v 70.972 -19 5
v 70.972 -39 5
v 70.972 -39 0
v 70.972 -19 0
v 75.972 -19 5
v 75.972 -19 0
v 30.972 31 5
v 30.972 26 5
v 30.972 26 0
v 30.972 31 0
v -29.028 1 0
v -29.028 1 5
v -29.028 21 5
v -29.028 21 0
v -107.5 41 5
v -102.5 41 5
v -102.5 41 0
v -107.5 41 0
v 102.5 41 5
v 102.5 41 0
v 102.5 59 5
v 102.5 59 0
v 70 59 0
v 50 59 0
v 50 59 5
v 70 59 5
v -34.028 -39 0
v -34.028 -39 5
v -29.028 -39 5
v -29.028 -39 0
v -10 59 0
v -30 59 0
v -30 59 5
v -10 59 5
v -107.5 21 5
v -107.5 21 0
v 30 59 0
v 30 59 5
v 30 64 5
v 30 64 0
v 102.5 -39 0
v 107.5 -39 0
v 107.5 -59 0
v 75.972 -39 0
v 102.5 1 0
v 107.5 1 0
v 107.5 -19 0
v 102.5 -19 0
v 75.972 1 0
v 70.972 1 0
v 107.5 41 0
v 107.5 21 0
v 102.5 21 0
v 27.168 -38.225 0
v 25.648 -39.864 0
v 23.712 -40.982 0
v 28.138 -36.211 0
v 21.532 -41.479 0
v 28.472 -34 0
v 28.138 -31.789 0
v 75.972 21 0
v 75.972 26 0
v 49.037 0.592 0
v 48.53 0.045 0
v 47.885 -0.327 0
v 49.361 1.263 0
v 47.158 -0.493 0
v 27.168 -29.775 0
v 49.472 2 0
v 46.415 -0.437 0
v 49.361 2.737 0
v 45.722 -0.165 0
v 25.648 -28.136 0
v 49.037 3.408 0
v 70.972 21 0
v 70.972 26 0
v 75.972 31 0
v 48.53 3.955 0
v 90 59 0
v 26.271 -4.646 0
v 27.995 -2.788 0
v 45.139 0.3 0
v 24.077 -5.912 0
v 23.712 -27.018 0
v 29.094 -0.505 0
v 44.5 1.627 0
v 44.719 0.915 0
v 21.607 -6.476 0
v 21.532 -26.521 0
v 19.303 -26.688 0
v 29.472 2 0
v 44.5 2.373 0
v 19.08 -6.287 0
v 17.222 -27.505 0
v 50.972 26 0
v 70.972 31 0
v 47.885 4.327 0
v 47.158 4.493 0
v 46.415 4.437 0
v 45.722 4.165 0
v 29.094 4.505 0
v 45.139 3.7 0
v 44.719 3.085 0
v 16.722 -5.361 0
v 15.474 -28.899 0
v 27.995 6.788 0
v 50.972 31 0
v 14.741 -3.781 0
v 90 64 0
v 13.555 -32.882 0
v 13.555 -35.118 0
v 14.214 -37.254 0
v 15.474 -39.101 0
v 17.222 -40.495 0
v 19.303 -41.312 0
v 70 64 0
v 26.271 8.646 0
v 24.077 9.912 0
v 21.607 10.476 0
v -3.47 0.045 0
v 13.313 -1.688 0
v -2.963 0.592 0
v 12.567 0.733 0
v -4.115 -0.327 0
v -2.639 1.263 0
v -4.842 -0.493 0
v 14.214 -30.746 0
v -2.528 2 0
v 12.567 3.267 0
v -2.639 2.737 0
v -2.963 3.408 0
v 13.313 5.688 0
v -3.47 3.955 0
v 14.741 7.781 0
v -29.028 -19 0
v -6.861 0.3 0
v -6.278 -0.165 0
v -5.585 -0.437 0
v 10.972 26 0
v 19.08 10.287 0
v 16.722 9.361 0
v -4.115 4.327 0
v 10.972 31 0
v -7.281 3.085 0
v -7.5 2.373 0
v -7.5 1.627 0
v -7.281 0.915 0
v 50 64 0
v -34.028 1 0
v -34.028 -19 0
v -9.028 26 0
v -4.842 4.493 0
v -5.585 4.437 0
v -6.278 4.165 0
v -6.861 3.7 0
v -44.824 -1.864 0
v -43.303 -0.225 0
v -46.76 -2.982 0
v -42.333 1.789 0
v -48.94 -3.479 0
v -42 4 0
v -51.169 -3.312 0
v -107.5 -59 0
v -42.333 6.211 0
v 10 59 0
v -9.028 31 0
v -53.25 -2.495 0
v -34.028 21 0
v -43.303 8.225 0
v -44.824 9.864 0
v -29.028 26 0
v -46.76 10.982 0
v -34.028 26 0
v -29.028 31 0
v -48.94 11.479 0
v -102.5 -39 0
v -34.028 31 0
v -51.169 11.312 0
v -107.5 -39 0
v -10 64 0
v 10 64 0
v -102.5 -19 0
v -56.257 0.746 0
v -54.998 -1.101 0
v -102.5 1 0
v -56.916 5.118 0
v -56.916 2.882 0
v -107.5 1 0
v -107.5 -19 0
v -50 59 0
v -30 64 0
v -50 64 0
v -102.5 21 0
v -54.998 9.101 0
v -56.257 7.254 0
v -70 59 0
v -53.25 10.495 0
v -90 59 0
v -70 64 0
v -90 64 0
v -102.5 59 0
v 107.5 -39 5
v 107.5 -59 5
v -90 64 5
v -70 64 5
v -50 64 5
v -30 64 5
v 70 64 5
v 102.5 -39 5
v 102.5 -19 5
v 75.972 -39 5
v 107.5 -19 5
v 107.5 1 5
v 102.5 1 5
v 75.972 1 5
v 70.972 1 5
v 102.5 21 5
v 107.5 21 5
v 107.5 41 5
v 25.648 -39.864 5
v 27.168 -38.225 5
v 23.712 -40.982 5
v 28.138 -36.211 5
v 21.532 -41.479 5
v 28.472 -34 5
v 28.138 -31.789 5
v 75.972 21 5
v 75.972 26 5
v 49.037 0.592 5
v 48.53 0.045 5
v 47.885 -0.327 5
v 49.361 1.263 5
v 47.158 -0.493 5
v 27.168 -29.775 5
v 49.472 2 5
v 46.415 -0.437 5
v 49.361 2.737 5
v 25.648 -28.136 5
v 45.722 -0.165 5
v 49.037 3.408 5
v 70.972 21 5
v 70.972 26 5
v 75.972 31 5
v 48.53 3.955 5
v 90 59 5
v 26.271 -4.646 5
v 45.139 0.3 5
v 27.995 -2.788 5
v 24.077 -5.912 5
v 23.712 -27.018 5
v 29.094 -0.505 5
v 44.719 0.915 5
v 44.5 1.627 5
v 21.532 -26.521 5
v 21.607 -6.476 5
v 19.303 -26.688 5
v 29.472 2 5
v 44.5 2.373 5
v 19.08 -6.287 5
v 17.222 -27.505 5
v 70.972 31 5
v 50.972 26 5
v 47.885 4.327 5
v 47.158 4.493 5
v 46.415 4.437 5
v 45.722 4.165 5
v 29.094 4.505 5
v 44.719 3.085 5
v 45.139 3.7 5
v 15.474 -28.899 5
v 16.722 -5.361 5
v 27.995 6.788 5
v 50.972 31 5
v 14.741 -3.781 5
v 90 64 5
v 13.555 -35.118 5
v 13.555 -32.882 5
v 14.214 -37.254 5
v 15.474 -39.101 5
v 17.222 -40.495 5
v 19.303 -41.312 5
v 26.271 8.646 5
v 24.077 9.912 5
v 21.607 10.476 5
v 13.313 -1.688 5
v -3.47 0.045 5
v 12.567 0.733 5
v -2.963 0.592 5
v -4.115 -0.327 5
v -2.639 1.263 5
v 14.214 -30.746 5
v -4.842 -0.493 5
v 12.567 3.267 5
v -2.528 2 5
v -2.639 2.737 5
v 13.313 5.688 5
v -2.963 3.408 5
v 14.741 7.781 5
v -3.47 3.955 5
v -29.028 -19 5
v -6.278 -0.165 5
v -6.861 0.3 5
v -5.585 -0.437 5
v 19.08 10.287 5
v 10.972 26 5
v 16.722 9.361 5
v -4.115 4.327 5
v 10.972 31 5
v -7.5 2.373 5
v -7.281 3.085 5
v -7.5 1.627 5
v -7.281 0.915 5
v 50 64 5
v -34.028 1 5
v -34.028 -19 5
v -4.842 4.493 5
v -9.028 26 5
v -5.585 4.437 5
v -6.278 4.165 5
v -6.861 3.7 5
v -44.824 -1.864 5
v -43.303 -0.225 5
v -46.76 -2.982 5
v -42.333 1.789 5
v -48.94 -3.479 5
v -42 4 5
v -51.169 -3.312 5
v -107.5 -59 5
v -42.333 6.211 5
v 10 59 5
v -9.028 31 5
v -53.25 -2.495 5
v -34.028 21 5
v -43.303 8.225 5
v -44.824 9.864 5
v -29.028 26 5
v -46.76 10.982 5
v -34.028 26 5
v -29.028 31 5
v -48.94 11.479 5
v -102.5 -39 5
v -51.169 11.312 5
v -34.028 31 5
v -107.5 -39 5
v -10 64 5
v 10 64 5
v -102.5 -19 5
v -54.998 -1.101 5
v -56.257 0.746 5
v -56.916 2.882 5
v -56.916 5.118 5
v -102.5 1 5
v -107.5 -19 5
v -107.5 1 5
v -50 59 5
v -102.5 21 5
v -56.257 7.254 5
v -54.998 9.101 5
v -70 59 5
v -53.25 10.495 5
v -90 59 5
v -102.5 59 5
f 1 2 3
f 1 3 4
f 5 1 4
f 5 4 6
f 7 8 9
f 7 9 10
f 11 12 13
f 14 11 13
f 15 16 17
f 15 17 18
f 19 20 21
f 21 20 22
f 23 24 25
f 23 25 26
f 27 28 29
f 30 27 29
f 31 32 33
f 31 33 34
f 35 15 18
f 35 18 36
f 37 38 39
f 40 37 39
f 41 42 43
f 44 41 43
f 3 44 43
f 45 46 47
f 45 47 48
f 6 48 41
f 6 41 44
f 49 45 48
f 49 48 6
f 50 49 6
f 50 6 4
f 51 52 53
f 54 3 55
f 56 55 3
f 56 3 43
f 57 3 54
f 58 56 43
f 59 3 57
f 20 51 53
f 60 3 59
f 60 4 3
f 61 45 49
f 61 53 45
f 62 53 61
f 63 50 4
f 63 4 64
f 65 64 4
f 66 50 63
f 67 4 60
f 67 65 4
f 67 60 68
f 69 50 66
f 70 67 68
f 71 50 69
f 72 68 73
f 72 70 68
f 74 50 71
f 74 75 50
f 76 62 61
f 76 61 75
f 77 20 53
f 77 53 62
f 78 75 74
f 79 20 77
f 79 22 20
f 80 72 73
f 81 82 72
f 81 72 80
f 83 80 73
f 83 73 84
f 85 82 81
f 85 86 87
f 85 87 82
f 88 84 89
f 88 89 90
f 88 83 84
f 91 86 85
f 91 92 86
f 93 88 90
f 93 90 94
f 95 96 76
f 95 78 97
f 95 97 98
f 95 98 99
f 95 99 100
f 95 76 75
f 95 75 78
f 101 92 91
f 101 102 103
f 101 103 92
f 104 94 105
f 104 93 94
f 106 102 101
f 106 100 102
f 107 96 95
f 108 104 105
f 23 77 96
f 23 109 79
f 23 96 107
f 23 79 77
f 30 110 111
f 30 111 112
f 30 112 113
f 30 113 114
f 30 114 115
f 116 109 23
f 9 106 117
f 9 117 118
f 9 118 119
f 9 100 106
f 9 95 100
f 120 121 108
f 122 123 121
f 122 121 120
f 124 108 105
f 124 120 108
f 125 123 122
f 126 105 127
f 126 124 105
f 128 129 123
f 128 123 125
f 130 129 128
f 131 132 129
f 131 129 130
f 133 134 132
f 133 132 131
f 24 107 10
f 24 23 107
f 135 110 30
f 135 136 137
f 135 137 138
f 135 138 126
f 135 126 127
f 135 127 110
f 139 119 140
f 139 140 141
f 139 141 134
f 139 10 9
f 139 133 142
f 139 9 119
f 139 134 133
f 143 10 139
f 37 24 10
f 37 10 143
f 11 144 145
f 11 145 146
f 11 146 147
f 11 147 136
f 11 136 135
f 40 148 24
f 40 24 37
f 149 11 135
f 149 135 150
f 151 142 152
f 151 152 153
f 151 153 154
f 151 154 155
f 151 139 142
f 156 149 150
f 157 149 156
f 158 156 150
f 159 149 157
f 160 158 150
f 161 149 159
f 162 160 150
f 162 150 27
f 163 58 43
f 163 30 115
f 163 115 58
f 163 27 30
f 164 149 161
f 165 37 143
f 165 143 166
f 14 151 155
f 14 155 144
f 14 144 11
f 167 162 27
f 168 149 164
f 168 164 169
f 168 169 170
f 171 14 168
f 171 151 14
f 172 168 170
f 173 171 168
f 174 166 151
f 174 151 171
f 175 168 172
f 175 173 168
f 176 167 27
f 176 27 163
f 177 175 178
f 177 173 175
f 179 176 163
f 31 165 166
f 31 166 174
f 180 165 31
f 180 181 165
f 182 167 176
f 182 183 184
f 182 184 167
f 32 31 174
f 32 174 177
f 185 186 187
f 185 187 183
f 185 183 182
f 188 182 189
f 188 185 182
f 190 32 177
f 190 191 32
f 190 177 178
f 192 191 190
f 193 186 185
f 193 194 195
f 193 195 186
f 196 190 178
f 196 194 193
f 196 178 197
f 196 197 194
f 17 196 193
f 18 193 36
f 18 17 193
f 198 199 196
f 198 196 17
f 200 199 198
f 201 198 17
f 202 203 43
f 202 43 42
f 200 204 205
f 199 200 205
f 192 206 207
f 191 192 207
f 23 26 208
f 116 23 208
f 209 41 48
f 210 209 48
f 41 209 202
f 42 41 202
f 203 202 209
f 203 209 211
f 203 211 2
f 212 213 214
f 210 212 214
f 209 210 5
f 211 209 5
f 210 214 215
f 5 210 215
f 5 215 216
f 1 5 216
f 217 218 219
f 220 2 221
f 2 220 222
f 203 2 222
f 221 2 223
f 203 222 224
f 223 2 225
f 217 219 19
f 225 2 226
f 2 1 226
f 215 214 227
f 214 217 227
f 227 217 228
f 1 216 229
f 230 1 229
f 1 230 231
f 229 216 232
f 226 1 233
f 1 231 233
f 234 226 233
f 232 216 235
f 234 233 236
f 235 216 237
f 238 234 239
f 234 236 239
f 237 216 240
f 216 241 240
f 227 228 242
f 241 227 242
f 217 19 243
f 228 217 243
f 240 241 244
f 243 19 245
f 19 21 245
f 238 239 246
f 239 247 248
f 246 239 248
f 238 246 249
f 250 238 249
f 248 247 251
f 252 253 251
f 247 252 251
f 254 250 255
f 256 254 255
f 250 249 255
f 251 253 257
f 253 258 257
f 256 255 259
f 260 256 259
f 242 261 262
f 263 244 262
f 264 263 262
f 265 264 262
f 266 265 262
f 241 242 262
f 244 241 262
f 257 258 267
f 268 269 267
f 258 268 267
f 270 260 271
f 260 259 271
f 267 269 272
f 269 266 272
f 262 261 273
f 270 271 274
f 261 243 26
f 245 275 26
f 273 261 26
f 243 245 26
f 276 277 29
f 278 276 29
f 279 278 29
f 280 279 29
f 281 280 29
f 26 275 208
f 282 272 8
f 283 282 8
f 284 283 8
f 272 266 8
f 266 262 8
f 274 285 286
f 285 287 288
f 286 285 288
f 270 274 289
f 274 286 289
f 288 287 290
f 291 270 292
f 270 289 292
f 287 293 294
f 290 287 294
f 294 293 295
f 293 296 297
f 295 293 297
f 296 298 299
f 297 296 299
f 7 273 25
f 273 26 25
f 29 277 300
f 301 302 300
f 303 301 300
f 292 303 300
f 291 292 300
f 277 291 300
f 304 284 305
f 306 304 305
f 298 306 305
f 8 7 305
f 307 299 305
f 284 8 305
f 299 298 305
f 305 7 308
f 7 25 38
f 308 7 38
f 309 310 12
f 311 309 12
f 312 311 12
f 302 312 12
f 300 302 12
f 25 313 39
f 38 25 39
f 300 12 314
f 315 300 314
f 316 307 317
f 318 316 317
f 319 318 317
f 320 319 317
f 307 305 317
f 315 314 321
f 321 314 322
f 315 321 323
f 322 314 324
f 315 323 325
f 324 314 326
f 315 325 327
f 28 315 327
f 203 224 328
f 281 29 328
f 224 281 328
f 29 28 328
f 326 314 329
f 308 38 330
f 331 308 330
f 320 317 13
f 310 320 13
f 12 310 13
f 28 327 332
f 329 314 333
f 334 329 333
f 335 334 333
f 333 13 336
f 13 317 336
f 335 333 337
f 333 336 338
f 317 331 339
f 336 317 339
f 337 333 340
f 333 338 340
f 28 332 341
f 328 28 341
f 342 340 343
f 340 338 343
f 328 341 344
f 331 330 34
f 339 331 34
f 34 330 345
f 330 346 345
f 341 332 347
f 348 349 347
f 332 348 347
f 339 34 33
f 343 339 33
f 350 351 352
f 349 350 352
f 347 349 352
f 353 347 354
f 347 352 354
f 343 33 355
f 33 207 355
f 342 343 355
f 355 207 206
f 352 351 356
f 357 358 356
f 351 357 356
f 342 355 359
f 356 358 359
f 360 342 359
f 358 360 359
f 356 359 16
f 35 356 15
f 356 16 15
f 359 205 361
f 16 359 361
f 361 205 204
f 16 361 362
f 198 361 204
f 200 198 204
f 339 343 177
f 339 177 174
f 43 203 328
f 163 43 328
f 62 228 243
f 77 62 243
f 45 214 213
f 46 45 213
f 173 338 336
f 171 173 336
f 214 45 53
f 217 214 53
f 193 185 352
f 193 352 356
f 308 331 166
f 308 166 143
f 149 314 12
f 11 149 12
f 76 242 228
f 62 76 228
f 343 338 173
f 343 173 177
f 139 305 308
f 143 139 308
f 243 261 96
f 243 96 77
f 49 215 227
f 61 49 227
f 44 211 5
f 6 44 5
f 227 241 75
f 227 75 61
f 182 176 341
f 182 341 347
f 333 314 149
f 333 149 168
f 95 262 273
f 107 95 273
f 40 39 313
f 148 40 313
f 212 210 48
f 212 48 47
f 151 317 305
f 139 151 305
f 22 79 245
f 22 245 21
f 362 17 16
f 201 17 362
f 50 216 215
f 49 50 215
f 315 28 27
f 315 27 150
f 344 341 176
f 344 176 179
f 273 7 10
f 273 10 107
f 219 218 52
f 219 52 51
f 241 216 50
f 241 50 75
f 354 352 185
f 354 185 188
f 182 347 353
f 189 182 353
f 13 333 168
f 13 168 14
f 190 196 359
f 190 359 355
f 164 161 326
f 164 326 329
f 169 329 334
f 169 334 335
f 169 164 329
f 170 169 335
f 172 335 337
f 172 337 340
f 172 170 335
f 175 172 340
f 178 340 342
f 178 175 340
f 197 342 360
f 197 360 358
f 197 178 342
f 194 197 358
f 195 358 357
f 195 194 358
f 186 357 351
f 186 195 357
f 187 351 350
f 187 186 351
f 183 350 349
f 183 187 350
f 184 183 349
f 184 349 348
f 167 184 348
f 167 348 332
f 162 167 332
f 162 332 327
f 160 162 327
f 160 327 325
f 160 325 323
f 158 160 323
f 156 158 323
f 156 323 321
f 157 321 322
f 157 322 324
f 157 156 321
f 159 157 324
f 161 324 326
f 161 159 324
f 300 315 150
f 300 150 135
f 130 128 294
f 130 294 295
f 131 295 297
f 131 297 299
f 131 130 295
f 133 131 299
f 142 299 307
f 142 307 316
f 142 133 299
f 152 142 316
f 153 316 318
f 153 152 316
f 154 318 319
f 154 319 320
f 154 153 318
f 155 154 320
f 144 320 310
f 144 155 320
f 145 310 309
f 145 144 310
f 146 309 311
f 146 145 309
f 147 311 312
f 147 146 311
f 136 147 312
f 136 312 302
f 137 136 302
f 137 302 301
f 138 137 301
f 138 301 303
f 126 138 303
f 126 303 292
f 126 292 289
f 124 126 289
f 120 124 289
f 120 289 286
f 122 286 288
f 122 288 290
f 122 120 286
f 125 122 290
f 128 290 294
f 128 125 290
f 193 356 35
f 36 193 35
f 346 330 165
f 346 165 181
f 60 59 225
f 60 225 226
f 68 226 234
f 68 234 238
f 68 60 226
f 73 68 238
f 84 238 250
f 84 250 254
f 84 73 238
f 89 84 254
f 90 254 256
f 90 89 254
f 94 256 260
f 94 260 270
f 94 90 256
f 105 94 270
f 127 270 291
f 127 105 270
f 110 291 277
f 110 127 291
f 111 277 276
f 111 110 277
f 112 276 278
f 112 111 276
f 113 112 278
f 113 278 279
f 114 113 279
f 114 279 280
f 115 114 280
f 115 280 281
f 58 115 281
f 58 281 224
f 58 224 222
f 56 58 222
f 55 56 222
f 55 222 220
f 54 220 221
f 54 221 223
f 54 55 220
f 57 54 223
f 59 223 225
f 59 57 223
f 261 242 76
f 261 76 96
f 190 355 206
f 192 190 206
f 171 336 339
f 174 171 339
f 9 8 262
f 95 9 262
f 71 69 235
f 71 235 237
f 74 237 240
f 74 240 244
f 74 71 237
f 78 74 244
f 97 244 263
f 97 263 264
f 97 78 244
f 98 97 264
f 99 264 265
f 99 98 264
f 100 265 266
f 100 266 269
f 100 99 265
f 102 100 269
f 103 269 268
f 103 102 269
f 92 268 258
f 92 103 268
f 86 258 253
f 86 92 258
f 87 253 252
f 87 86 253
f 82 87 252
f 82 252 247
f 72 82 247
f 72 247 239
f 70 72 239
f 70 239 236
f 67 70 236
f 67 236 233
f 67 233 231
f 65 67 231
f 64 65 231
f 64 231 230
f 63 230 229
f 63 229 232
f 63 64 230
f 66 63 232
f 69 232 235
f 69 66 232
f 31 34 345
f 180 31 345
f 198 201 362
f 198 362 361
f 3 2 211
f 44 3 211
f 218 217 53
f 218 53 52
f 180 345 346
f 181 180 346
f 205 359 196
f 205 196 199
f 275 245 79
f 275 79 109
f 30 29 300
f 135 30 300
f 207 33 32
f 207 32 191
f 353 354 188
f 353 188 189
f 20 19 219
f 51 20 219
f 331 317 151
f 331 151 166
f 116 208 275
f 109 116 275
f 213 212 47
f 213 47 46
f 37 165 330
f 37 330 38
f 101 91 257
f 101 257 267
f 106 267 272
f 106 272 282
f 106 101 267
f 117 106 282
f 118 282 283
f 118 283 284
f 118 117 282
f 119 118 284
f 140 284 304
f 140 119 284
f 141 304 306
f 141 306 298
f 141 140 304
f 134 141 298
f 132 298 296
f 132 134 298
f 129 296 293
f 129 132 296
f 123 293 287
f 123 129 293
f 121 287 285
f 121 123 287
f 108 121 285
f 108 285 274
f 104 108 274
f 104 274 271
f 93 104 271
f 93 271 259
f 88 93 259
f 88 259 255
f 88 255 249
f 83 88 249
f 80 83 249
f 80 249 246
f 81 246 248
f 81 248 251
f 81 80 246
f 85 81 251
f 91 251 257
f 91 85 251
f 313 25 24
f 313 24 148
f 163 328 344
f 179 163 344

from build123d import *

# Parameters (mm, degrees)
SKETCH_1_W               = 205
SKETCH_1_H               = 118
SKETCH_1_R               = 8.5
SKETCH_1_R_2             = 7.5
SKETCH_1_R_3             = 2.5
EXTRUDE_1_DEPTH          = 5
SKETCH_2_W               = 5
SKETCH_2_H               = 20
EXTRUDE_2_DEPTH          = 5
PATTERN_LINEAR_2_COUNT   = 3
PATTERN_LINEAR_2_PITCH   = 40
MIRROR_2_COPY_1_SKETCH_W = 5
MIRROR_2_COPY_1_SKETCH_H = 20
MIRROR_2_COPY_1_DEPTH    = 5
MIRROR_2_COPY_2_SKETCH_W = 5
MIRROR_2_COPY_2_SKETCH_H = 20
MIRROR_2_COPY_2_DEPTH    = 5
SKETCH_3_W               = 20
SKETCH_3_H               = 5
EXTRUDE_3_DEPTH          = 5
PATTERN_LINEAR_3_COUNT   = 3
PATTERN_LINEAR_3_PITCH   = 40
PATTERN_LINEAR_4_COUNT   = 3
PATTERN_LINEAR_4_PITCH   = 40
SKETCH_5_W               = 5
SKETCH_5_H               = 20
CUT_EXTRUDE_1_DEPTH      = 5
PATTERN_LINEAR_5_COUNT   = 2
PATTERN_LINEAR_5_PITCH   = 40
SKETCH_5_3_W             = 20
SKETCH_5_3_H             = 5
CUT_EXTRUDE_2_DEPTH      = 5
PATTERN_LINEAR_6_COUNT   = 2
PATTERN_LINEAR_6_PITCH   = 40
SKETCH_6_W               = 5
SKETCH_6_H               = 5
CUT_EXTRUDE_3_DEPTH      = 5


with BuildPart() as part:
    # 스케치1 → 보스-돌출1 (new body)
    with BuildSketch(Plane.XY):
        Rectangle(SKETCH_1_W, SKETCH_1_H)
        with Locations((20.971625496, 2)):
            Circle(SKETCH_1_R, mode=Mode.SUBTRACT)
        with Locations((-49.5, 4)):
            Circle(SKETCH_1_R_2, mode=Mode.SUBTRACT)
        with Locations((-5.028374504, 2)):
            Circle(SKETCH_1_R_3, mode=Mode.SUBTRACT)
        with Locations((46.971625496, 2)):
            Circle(SKETCH_1_R_3, mode=Mode.SUBTRACT)
        with Locations((20.971625496, -34)):
            Circle(SKETCH_1_R_2, mode=Mode.SUBTRACT)
    extrude(amount=EXTRUDE_1_DEPTH)

    # 스케치2 → 보스-돌출2 (add)
    with BuildSketch(Plane.XY.offset(5)):
        with Locations((105, -49)):
            Rectangle(SKETCH_2_W, SKETCH_2_H)
    extrude_2 = extrude(amount=-EXTRUDE_2_DEPTH)

    # 선형 패턴2: 보스-돌출2 ×3
    with Locations(*[(0, i * PATTERN_LINEAR_2_PITCH, 0) for i in range(1, PATTERN_LINEAR_2_COUNT)]):
        add(extrude_2)

    # 대칭 복사2: 보스-돌출2 across plane
    add(extrude_2.mirror(Plane(origin=(0, 0, 0), x_dir=(0, 0, 1), z_dir=(1, 0, 0))))

    # 대칭 복사2 copy 1 sketch → 대칭 복사2 copy 1 (add)
    with BuildSketch(Plane(origin=(0, 40, 5), x_dir=(-1, 0, 0), z_dir=(0, 0, 1))):
        with Locations((105, 49)):
            Rectangle(MIRROR_2_COPY_1_SKETCH_W, MIRROR_2_COPY_1_SKETCH_H)
    extrude(amount=-MIRROR_2_COPY_1_DEPTH)

    # 대칭 복사2 copy 2 sketch → 대칭 복사2 copy 2 (add)
    with BuildSketch(Plane(origin=(0, 80, 5), x_dir=(-1, 0, 0), z_dir=(0, 0, 1))):
        with Locations((105, 49)):
            Rectangle(MIRROR_2_COPY_2_SKETCH_W, MIRROR_2_COPY_2_SKETCH_H)
    extrude(amount=-MIRROR_2_COPY_2_DEPTH)

    # 스케치3 → 보스-돌출3 (add)
    with BuildSketch(Plane.XY.offset(5)):
        with Locations((0, 61.5)):
            Rectangle(SKETCH_3_W, SKETCH_3_H)
    extrude_3 = extrude(amount=-EXTRUDE_3_DEPTH)

    # 선형 패턴3: 보스-돌출3 ×3
    with Locations(*[(i * PATTERN_LINEAR_3_PITCH, 0, 0) for i in range(1, PATTERN_LINEAR_3_COUNT)]):
        add(extrude_3)

    # 선형 패턴4: 보스-돌출3 ×3
    with Locations(*[(-i * PATTERN_LINEAR_4_PITCH, 0, 0) for i in range(1, PATTERN_LINEAR_4_COUNT)]):
        add(extrude_3)

    # 스케치5 → 컷-돌출1 (cut)
    with BuildSketch(Plane.XY.offset(5)):
        with Locations((73.471625496, -29)):
            Rectangle(SKETCH_5_W, SKETCH_5_H)
        with Locations((-31.528374504, -29)):
            Rectangle(SKETCH_5_W, SKETCH_5_H)
    cut_extrude_1 = extrude(amount=-CUT_EXTRUDE_1_DEPTH, mode=Mode.SUBTRACT)

    # 선형 패턴5: 컷-돌출1 ×2
    with Locations(*[(0, i * PATTERN_LINEAR_5_PITCH, 0) for i in range(1, PATTERN_LINEAR_5_COUNT)]):
        add(cut_extrude_1, mode=Mode.SUBTRACT)

    # 스케치5<3> → 컷-돌출2 (cut)
    with BuildSketch(Plane.XY.offset(5)):
        with Locations((40.971625496, 28.5)):
            Rectangle(SKETCH_5_3_W, SKETCH_5_3_H)
    cut_extrude_2 = extrude(amount=-CUT_EXTRUDE_2_DEPTH, mode=Mode.SUBTRACT)

    # 선형 패턴6: 컷-돌출2 ×2
    with Locations(*[(-i * PATTERN_LINEAR_6_PITCH, 0, 0) for i in range(1, PATTERN_LINEAR_6_COUNT)]):
        add(cut_extrude_2, mode=Mode.SUBTRACT)

    # 스케치6 → 컷-돌출3 (cut)
    with BuildSketch(Plane.XY.offset(5)):
        with Locations((73.471625496, 28.5)):
            Rectangle(SKETCH_6_W, SKETCH_6_H)
        with Locations((-31.528374504, 28.5)):
            Rectangle(SKETCH_6_W, SKETCH_6_H)
    extrude(amount=-CUT_EXTRUDE_3_DEPTH, mode=Mode.SUBTRACT)


solid = part.part
